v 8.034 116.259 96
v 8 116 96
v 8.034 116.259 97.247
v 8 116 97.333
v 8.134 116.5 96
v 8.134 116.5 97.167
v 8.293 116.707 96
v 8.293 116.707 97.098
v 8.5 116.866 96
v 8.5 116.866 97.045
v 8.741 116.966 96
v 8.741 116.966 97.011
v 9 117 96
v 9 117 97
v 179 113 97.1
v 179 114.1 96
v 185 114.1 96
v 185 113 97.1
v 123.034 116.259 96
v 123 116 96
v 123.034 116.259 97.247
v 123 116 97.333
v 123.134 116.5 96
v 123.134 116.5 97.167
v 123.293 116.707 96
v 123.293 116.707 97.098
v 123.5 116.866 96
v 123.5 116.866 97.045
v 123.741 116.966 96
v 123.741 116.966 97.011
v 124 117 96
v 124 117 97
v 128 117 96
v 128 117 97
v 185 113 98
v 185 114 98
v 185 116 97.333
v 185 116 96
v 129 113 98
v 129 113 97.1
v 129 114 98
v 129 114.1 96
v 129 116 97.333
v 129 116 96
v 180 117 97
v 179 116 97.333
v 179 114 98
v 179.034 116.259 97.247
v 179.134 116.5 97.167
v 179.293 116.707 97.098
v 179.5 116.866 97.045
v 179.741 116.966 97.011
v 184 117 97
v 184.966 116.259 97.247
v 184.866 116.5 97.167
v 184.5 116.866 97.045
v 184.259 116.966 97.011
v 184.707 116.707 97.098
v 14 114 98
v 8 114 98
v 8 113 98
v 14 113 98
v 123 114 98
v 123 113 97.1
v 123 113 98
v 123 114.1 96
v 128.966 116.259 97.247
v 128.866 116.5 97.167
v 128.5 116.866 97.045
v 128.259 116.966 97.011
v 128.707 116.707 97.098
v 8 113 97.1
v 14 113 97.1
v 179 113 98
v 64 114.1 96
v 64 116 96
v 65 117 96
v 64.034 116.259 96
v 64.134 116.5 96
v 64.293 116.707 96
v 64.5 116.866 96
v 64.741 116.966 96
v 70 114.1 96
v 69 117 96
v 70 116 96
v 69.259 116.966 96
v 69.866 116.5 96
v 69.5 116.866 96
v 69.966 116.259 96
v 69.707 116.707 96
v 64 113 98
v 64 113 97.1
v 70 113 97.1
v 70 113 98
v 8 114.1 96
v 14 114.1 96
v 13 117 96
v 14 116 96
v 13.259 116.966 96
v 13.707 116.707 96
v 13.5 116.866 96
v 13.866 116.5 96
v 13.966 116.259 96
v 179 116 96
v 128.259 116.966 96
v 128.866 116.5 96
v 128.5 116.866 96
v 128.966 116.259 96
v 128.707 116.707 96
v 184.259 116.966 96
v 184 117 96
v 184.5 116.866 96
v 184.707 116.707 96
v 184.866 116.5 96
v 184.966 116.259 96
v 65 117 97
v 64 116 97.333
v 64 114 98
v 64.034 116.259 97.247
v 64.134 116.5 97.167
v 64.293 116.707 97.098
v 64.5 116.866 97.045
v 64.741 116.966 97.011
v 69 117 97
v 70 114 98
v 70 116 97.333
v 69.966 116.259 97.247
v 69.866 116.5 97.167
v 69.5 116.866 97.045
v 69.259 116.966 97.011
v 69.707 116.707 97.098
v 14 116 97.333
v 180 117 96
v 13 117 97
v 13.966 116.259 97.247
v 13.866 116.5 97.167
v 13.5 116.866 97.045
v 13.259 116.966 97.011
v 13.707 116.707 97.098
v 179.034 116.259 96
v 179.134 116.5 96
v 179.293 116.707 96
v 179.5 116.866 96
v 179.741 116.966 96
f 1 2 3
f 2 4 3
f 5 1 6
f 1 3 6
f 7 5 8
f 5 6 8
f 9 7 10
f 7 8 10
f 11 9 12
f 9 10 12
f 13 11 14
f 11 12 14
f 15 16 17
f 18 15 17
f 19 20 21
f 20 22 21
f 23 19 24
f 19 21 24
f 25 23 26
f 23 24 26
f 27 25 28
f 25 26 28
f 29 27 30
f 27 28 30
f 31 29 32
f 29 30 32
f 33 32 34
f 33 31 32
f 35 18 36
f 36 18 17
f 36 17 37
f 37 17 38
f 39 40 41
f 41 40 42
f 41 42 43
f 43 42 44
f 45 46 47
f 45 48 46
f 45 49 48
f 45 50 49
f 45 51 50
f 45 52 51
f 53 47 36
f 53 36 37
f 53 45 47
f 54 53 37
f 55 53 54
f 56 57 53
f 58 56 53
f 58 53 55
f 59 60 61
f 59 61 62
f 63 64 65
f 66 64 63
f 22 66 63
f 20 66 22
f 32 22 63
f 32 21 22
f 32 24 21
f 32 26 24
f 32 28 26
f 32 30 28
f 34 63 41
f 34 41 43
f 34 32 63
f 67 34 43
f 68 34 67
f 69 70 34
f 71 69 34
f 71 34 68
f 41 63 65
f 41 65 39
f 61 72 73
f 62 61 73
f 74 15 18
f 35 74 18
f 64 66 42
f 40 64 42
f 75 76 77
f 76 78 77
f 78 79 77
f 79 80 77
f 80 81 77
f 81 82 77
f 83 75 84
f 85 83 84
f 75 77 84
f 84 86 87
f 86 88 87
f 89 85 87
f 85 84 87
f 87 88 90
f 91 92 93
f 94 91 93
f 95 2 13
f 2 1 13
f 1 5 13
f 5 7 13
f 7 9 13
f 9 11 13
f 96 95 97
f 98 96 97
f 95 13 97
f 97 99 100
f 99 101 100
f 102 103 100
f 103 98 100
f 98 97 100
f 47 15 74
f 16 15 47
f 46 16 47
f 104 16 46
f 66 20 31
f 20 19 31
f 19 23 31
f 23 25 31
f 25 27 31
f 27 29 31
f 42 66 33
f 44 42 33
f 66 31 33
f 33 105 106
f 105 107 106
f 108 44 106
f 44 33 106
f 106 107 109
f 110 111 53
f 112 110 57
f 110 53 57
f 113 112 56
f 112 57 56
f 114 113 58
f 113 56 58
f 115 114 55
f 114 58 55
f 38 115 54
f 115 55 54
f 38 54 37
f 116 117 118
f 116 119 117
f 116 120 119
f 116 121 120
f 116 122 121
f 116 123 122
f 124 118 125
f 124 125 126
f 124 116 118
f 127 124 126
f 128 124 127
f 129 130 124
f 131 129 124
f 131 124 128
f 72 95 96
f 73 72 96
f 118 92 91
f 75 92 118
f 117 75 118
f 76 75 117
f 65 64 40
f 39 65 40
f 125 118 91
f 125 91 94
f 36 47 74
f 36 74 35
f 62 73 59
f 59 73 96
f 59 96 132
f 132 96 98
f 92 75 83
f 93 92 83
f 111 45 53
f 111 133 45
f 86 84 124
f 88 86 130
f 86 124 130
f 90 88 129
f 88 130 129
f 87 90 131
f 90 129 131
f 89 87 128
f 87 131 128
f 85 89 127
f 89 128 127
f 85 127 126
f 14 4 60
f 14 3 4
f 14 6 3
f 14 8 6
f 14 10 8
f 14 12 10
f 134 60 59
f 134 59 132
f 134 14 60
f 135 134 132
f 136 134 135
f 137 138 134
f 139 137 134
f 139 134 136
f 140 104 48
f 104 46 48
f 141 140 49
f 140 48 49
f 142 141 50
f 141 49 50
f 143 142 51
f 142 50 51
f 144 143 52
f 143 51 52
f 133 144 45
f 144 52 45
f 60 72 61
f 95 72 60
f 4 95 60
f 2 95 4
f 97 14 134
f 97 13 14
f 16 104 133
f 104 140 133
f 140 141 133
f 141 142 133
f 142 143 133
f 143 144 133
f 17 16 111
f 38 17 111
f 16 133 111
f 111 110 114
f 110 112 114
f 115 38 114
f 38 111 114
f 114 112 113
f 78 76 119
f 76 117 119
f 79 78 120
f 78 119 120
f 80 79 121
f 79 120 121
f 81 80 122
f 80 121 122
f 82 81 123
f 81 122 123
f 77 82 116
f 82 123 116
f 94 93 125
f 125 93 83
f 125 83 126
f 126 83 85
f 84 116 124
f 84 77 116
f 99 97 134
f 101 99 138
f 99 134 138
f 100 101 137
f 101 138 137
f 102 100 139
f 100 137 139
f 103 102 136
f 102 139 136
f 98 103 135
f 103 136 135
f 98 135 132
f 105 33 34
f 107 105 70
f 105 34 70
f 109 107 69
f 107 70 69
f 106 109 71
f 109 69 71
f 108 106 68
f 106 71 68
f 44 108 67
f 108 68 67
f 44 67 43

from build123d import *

# Parameters (mm, degrees)
BOX085189_W                  = 6
BOX085189_H                  = 4
BOX085189_DEPTH              = 2
CHAMFER011006003017072_SIZE  = 1.1
CHAMFER011006003017073_SIZE2 = 1
CHAMFER011006003017073_SIZE  = 3
BOX085188_W                  = 6
BOX085188_H                  = 4
BOX085188_DEPTH              = 2
CHAMFER011006003017070_SIZE  = 1.1
CHAMFER011006003017071_SIZE2 = 1
CHAMFER011006003017071_SIZE  = 3
BOX085187_W                  = 6
BOX085187_H                  = 4
BOX085187_DEPTH              = 2
CHAMFER011006003017068_SIZE  = 1.1
CHAMFER011006003017069_SIZE2 = 1
CHAMFER011006003017069_SIZE  = 3
BOX085190_W                  = 6
BOX085190_H                  = 4
BOX085190_DEPTH              = 2
CHAMFER011006003017074_SIZE  = 1.1
CHAMFER011006003017075_SIZE2 = 1
CHAMFER011006003017075_SIZE  = 3
FILLET005011017082051_R      = 1


with BuildPart() as chamfer011006003017073:
    # Box085189 → Box085189 (new body)
    with BuildSketch(Plane(origin=(123, 113, 96), x_dir=(1, 0, 0), z_dir=(0, 0, 1))):
        with Locations((3, 2)):
            Rectangle(BOX085189_W, BOX085189_H)
    extrude(amount=BOX085189_DEPTH)

    # Chamfer011006003017072
    chamfer011006003017072_edges = [chamfer011006003017073.edges().sort_by_distance(p)[0] for p in [
        (126, 113, 96),
    ]]
    chamfer(chamfer011006003017072_edges, length=CHAMFER011006003017072_SIZE)

    # Chamfer011006003017073
    chamfer011006003017073_edges = [chamfer011006003017073.edges().sort_by_distance(p)[0] for p in [
        (126, 117, 98),
    ]]
    chamfer011006003017073_side = chamfer011006003017073.faces().sort_by_distance((126, 115, 98))[0]
    chamfer(chamfer011006003017073_edges, length=CHAMFER011006003017073_SIZE, length2=CHAMFER011006003017073_SIZE2, reference=chamfer011006003017073_side)


with BuildPart() as chamfer011006003017071:
    # Box085188 → Box085188 (new body)
    with BuildSketch(Plane(origin=(64, 113, 96), x_dir=(1, 0, 0), z_dir=(0, 0, 1))):
        with Locations((3, 2)):
            Rectangle(BOX085188_W, BOX085188_H)
    extrude(amount=BOX085188_DEPTH)

    # Chamfer011006003017070
    chamfer011006003017070_edges = [chamfer011006003017071.edges().sort_by_distance(p)[0] for p in [
        (67, 113, 96),
    ]]
    chamfer(chamfer011006003017070_edges, length=CHAMFER011006003017070_SIZE)

    # Chamfer011006003017071
    chamfer011006003017071_edges = [chamfer011006003017071.edges().sort_by_distance(p)[0] for p in [
        (67, 117, 98),
    ]]
    chamfer011006003017071_side = chamfer011006003017071.faces().sort_by_distance((67, 115, 98))[0]
    chamfer(chamfer011006003017071_edges, length=CHAMFER011006003017071_SIZE, length2=CHAMFER011006003017071_SIZE2, reference=chamfer011006003017071_side)


with BuildPart() as chamfer011006003017069:
    # Box085187 → Box085187 (new body)
    with BuildSketch(Plane(origin=(8, 113, 96), x_dir=(1, 0, 0), z_dir=(0, 0, 1))):
        with Locations((3, 2)):
            Rectangle(BOX085187_W, BOX085187_H)
    extrude(amount=BOX085187_DEPTH)

    # Chamfer011006003017068
    chamfer011006003017068_edges = [chamfer011006003017069.edges().sort_by_distance(p)[0] for p in [
        (11, 113, 96),
    ]]
    chamfer(chamfer011006003017068_edges, length=CHAMFER011006003017068_SIZE)

    # Chamfer011006003017069
    chamfer011006003017069_edges = [chamfer011006003017069.edges().sort_by_distance(p)[0] for p in [
        (11, 117, 98),
    ]]
    chamfer011006003017069_side = chamfer011006003017069.faces().sort_by_distance((11, 115, 98))[0]
    chamfer(chamfer011006003017069_edges, length=CHAMFER011006003017069_SIZE, length2=CHAMFER011006003017069_SIZE2, reference=chamfer011006003017069_side)


with BuildPart() as top_tabs:
    # Box085190 → Box085190 (new body)
    with BuildSketch(Plane(origin=(179, 113, 96), x_dir=(1, 0, 0), z_dir=(0, 0, 1))):
        with Locations((3, 2)):
            Rectangle(BOX085190_W, BOX085190_H)
    extrude(amount=BOX085190_DEPTH)

    # Chamfer011006003017074
    chamfer011006003017074_edges = [top_tabs.edges().sort_by_distance(p)[0] for p in [
        (182, 113, 96),
    ]]
    chamfer(chamfer011006003017074_edges, length=CHAMFER011006003017074_SIZE)

    # Chamfer011006003017075
    chamfer011006003017075_edges = [top_tabs.edges().sort_by_distance(p)[0] for p in [
        (182, 117, 98),
    ]]
    chamfer011006003017075_side = top_tabs.faces().sort_by_distance((182, 115, 98))[0]
    chamfer(chamfer011006003017075_edges, length=CHAMFER011006003017075_SIZE, length2=CHAMFER011006003017075_SIZE2, reference=chamfer011006003017075_side)

    # Fusion004008002002002001007002002026012042: union Chamfer011006003017073, Chamfer011006003017071, Chamfer011006003017069
    add(chamfer011006003017073.part)
    add(chamfer011006003017071.part)
    add(chamfer011006003017069.part)

    # Fillet005011017082051
    fillet005011017082051_edges = [top_tabs.edges().sort_by_distance(p)[0] for p in [
        (179, 117, 96.5),
        (185, 117, 96.5),
        (123, 117, 96.5),
        (129, 117, 96.5),
        (64, 117, 96.5),
        (70, 117, 96.5),
        (8, 117, 96.5),
        (14, 117, 96.5),
    ]]
    fillet(fillet005011017082051_edges, radius=FILLET005011017082051_R)


solid = top_tabs.part
